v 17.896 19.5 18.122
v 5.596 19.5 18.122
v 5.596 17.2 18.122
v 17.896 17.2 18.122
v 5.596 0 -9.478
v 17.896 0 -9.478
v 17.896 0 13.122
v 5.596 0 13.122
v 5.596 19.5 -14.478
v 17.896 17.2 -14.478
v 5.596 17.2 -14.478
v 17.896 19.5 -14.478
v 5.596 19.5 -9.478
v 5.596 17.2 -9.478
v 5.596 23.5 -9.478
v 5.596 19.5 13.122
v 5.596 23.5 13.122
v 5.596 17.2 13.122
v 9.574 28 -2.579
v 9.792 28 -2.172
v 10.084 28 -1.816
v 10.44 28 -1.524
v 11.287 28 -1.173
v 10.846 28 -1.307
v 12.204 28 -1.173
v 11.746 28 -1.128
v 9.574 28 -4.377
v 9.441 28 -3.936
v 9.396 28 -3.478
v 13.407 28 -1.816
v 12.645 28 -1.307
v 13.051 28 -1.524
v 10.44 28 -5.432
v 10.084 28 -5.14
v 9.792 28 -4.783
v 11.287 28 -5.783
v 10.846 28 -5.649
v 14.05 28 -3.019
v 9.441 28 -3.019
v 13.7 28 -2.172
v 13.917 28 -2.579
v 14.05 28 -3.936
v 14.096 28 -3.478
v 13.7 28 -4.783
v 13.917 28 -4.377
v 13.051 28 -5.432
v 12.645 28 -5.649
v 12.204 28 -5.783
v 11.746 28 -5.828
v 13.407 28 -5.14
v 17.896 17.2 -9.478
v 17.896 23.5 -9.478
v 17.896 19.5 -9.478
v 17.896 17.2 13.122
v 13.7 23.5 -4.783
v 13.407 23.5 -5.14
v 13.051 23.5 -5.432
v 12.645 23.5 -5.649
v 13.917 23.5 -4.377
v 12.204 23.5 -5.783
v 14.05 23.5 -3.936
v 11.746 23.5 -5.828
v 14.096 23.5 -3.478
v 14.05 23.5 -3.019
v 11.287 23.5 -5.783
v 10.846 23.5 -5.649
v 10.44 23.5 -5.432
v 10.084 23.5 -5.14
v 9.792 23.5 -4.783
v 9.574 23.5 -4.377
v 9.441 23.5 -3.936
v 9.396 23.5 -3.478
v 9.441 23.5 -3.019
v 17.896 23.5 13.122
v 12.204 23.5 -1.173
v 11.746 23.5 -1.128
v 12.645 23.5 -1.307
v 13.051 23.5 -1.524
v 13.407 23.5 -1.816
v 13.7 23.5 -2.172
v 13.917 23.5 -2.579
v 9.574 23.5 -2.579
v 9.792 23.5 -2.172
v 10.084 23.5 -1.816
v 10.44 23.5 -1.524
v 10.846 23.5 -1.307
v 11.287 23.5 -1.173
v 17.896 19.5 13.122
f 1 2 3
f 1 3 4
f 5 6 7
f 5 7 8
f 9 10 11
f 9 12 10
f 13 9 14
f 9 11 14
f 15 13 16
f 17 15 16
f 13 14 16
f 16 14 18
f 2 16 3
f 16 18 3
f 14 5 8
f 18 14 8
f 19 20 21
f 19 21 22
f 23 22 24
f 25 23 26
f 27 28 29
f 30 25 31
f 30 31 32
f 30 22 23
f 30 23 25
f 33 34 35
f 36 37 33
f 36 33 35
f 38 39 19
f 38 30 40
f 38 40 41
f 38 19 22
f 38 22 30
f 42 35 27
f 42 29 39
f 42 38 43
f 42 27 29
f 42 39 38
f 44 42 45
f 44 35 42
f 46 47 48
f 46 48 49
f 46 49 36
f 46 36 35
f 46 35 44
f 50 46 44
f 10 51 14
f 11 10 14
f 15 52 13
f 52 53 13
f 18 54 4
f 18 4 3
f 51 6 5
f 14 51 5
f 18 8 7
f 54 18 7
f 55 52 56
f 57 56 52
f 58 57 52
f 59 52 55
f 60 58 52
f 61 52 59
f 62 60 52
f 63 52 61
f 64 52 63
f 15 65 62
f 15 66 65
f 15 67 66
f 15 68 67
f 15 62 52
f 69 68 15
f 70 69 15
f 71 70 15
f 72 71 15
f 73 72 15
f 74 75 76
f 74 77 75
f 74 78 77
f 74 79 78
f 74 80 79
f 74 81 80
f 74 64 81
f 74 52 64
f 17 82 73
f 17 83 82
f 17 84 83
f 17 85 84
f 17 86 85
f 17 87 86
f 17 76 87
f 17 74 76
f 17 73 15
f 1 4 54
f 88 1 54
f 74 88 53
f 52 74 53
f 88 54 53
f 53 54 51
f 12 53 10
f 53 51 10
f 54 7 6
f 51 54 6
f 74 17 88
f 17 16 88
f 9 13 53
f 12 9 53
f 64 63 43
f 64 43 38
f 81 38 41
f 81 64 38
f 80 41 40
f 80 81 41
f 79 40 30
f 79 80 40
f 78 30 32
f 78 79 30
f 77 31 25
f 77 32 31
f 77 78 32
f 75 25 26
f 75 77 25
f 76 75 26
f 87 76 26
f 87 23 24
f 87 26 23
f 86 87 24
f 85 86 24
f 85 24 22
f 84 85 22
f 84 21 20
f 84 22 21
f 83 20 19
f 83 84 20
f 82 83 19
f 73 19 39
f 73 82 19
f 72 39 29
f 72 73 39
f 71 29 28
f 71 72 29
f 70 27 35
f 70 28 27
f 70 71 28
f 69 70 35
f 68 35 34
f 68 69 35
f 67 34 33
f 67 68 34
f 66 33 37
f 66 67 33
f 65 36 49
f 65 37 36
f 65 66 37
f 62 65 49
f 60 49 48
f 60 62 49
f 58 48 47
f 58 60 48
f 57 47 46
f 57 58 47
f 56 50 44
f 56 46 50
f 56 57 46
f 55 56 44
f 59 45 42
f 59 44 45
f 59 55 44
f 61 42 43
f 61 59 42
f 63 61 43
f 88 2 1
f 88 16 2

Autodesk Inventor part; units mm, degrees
ref_plane "YZ Plane" through (0, 0, 0) normal (1, 0, 0) x (0, 1, 0)
ref_plane "XZ Plane" through (0, 0, 0) normal (0, 1, 0) x (-1, 0, 0)
ref_plane "XY Plane" through (0, 0, 0) normal (0, 0, 1) x (1, 0, 0)
sketch "Sketch1" plane through (0, 0, 0) normal (0, 1, 0) x (-1, 0, 0)
  line L0 (-17.8956, 13.1221) -> (-17.8956, -9.4779)
  line L1 (-17.8956, -9.4779) -> (-5.5956, -9.4779)
  line L2 (-5.5956, -9.4779) -> (-5.5956, 13.1221)
  line L3 (-5.5956, 13.1221) -> (-17.8956, 13.1221)
  point P0 (0, 0)
  dimension "d0" = 22.6
  dimension "d1" = 12.3
extrude "Extrusion1" add sketch "Sketch1" along normal blind 23.5
sketch "Sketch2" plane through (17.8956, 0, -9.4779) normal (0, 0, -1) x (-1, 0, 0)
  line L0 (0, 0) -> (0, 23.5) projected
  line L1 (12.3, 0) -> (12.3, 23.5) projected
  line L2 (0, 17.2) -> (12.3, 17.2)
  line L3 (12.3, 17.2) -> (12.3, 19.5)
  line L4 (12.3, 19.5) -> (0, 19.5)
  line L5 (0, 19.5) -> (0, 17.2)
  line L6 (0, 0) -> (12.3, 0) projected
  point P0 (17.8956, 0)
  point P1 (0, 19.5)
  dimension "d4" = 17.2
  dimension "d5" = 2.3
extrude "Extrusion2" add sketch "Sketch2" along normal blind 5 contours L0 L4 L1 L2
sketch "Sketch3" plane through (5.5956, 0, 13.1221) normal (0, 0, 1) x (1, 0, 0)
  line L0 (0, 19.5) -> (12.3, 19.5) projected
  line L1 (12.3, 17.2) -> (0, 17.2) projected
  line L2 (12.3, 19.5) -> (0, 19.5)
  line L3 (0, 19.5) -> (0, 17.2)
  line L4 (0, 17.2) -> (12.3, 17.2)
  line L5 (12.3, 17.2) -> (12.3, 19.5)
  point P0 (-5.5956, 0)
  point P1 (0, 19.5)
  point P2 (12.3, 17.2)
extrude "Extrusion3" add sketch "Sketch3" along normal blind 5
sketch "Sketch4" plane through (0, 23.5, 0) normal (0, 1, 0) x (1, 0, 0)
  circle A0 centre (11.7456, 3.4779) radius 2.35
  line L0 (17.8956, 9.4779) -> (5.5956, 9.4779) projected
  point P0 (0, 0)
  dimension "d10" = 4.7
  dimension "d11" = 6
extrude "Extrusion4" add sketch "Sketch4" along normal blind 4.5
properties part number "testingservo"
